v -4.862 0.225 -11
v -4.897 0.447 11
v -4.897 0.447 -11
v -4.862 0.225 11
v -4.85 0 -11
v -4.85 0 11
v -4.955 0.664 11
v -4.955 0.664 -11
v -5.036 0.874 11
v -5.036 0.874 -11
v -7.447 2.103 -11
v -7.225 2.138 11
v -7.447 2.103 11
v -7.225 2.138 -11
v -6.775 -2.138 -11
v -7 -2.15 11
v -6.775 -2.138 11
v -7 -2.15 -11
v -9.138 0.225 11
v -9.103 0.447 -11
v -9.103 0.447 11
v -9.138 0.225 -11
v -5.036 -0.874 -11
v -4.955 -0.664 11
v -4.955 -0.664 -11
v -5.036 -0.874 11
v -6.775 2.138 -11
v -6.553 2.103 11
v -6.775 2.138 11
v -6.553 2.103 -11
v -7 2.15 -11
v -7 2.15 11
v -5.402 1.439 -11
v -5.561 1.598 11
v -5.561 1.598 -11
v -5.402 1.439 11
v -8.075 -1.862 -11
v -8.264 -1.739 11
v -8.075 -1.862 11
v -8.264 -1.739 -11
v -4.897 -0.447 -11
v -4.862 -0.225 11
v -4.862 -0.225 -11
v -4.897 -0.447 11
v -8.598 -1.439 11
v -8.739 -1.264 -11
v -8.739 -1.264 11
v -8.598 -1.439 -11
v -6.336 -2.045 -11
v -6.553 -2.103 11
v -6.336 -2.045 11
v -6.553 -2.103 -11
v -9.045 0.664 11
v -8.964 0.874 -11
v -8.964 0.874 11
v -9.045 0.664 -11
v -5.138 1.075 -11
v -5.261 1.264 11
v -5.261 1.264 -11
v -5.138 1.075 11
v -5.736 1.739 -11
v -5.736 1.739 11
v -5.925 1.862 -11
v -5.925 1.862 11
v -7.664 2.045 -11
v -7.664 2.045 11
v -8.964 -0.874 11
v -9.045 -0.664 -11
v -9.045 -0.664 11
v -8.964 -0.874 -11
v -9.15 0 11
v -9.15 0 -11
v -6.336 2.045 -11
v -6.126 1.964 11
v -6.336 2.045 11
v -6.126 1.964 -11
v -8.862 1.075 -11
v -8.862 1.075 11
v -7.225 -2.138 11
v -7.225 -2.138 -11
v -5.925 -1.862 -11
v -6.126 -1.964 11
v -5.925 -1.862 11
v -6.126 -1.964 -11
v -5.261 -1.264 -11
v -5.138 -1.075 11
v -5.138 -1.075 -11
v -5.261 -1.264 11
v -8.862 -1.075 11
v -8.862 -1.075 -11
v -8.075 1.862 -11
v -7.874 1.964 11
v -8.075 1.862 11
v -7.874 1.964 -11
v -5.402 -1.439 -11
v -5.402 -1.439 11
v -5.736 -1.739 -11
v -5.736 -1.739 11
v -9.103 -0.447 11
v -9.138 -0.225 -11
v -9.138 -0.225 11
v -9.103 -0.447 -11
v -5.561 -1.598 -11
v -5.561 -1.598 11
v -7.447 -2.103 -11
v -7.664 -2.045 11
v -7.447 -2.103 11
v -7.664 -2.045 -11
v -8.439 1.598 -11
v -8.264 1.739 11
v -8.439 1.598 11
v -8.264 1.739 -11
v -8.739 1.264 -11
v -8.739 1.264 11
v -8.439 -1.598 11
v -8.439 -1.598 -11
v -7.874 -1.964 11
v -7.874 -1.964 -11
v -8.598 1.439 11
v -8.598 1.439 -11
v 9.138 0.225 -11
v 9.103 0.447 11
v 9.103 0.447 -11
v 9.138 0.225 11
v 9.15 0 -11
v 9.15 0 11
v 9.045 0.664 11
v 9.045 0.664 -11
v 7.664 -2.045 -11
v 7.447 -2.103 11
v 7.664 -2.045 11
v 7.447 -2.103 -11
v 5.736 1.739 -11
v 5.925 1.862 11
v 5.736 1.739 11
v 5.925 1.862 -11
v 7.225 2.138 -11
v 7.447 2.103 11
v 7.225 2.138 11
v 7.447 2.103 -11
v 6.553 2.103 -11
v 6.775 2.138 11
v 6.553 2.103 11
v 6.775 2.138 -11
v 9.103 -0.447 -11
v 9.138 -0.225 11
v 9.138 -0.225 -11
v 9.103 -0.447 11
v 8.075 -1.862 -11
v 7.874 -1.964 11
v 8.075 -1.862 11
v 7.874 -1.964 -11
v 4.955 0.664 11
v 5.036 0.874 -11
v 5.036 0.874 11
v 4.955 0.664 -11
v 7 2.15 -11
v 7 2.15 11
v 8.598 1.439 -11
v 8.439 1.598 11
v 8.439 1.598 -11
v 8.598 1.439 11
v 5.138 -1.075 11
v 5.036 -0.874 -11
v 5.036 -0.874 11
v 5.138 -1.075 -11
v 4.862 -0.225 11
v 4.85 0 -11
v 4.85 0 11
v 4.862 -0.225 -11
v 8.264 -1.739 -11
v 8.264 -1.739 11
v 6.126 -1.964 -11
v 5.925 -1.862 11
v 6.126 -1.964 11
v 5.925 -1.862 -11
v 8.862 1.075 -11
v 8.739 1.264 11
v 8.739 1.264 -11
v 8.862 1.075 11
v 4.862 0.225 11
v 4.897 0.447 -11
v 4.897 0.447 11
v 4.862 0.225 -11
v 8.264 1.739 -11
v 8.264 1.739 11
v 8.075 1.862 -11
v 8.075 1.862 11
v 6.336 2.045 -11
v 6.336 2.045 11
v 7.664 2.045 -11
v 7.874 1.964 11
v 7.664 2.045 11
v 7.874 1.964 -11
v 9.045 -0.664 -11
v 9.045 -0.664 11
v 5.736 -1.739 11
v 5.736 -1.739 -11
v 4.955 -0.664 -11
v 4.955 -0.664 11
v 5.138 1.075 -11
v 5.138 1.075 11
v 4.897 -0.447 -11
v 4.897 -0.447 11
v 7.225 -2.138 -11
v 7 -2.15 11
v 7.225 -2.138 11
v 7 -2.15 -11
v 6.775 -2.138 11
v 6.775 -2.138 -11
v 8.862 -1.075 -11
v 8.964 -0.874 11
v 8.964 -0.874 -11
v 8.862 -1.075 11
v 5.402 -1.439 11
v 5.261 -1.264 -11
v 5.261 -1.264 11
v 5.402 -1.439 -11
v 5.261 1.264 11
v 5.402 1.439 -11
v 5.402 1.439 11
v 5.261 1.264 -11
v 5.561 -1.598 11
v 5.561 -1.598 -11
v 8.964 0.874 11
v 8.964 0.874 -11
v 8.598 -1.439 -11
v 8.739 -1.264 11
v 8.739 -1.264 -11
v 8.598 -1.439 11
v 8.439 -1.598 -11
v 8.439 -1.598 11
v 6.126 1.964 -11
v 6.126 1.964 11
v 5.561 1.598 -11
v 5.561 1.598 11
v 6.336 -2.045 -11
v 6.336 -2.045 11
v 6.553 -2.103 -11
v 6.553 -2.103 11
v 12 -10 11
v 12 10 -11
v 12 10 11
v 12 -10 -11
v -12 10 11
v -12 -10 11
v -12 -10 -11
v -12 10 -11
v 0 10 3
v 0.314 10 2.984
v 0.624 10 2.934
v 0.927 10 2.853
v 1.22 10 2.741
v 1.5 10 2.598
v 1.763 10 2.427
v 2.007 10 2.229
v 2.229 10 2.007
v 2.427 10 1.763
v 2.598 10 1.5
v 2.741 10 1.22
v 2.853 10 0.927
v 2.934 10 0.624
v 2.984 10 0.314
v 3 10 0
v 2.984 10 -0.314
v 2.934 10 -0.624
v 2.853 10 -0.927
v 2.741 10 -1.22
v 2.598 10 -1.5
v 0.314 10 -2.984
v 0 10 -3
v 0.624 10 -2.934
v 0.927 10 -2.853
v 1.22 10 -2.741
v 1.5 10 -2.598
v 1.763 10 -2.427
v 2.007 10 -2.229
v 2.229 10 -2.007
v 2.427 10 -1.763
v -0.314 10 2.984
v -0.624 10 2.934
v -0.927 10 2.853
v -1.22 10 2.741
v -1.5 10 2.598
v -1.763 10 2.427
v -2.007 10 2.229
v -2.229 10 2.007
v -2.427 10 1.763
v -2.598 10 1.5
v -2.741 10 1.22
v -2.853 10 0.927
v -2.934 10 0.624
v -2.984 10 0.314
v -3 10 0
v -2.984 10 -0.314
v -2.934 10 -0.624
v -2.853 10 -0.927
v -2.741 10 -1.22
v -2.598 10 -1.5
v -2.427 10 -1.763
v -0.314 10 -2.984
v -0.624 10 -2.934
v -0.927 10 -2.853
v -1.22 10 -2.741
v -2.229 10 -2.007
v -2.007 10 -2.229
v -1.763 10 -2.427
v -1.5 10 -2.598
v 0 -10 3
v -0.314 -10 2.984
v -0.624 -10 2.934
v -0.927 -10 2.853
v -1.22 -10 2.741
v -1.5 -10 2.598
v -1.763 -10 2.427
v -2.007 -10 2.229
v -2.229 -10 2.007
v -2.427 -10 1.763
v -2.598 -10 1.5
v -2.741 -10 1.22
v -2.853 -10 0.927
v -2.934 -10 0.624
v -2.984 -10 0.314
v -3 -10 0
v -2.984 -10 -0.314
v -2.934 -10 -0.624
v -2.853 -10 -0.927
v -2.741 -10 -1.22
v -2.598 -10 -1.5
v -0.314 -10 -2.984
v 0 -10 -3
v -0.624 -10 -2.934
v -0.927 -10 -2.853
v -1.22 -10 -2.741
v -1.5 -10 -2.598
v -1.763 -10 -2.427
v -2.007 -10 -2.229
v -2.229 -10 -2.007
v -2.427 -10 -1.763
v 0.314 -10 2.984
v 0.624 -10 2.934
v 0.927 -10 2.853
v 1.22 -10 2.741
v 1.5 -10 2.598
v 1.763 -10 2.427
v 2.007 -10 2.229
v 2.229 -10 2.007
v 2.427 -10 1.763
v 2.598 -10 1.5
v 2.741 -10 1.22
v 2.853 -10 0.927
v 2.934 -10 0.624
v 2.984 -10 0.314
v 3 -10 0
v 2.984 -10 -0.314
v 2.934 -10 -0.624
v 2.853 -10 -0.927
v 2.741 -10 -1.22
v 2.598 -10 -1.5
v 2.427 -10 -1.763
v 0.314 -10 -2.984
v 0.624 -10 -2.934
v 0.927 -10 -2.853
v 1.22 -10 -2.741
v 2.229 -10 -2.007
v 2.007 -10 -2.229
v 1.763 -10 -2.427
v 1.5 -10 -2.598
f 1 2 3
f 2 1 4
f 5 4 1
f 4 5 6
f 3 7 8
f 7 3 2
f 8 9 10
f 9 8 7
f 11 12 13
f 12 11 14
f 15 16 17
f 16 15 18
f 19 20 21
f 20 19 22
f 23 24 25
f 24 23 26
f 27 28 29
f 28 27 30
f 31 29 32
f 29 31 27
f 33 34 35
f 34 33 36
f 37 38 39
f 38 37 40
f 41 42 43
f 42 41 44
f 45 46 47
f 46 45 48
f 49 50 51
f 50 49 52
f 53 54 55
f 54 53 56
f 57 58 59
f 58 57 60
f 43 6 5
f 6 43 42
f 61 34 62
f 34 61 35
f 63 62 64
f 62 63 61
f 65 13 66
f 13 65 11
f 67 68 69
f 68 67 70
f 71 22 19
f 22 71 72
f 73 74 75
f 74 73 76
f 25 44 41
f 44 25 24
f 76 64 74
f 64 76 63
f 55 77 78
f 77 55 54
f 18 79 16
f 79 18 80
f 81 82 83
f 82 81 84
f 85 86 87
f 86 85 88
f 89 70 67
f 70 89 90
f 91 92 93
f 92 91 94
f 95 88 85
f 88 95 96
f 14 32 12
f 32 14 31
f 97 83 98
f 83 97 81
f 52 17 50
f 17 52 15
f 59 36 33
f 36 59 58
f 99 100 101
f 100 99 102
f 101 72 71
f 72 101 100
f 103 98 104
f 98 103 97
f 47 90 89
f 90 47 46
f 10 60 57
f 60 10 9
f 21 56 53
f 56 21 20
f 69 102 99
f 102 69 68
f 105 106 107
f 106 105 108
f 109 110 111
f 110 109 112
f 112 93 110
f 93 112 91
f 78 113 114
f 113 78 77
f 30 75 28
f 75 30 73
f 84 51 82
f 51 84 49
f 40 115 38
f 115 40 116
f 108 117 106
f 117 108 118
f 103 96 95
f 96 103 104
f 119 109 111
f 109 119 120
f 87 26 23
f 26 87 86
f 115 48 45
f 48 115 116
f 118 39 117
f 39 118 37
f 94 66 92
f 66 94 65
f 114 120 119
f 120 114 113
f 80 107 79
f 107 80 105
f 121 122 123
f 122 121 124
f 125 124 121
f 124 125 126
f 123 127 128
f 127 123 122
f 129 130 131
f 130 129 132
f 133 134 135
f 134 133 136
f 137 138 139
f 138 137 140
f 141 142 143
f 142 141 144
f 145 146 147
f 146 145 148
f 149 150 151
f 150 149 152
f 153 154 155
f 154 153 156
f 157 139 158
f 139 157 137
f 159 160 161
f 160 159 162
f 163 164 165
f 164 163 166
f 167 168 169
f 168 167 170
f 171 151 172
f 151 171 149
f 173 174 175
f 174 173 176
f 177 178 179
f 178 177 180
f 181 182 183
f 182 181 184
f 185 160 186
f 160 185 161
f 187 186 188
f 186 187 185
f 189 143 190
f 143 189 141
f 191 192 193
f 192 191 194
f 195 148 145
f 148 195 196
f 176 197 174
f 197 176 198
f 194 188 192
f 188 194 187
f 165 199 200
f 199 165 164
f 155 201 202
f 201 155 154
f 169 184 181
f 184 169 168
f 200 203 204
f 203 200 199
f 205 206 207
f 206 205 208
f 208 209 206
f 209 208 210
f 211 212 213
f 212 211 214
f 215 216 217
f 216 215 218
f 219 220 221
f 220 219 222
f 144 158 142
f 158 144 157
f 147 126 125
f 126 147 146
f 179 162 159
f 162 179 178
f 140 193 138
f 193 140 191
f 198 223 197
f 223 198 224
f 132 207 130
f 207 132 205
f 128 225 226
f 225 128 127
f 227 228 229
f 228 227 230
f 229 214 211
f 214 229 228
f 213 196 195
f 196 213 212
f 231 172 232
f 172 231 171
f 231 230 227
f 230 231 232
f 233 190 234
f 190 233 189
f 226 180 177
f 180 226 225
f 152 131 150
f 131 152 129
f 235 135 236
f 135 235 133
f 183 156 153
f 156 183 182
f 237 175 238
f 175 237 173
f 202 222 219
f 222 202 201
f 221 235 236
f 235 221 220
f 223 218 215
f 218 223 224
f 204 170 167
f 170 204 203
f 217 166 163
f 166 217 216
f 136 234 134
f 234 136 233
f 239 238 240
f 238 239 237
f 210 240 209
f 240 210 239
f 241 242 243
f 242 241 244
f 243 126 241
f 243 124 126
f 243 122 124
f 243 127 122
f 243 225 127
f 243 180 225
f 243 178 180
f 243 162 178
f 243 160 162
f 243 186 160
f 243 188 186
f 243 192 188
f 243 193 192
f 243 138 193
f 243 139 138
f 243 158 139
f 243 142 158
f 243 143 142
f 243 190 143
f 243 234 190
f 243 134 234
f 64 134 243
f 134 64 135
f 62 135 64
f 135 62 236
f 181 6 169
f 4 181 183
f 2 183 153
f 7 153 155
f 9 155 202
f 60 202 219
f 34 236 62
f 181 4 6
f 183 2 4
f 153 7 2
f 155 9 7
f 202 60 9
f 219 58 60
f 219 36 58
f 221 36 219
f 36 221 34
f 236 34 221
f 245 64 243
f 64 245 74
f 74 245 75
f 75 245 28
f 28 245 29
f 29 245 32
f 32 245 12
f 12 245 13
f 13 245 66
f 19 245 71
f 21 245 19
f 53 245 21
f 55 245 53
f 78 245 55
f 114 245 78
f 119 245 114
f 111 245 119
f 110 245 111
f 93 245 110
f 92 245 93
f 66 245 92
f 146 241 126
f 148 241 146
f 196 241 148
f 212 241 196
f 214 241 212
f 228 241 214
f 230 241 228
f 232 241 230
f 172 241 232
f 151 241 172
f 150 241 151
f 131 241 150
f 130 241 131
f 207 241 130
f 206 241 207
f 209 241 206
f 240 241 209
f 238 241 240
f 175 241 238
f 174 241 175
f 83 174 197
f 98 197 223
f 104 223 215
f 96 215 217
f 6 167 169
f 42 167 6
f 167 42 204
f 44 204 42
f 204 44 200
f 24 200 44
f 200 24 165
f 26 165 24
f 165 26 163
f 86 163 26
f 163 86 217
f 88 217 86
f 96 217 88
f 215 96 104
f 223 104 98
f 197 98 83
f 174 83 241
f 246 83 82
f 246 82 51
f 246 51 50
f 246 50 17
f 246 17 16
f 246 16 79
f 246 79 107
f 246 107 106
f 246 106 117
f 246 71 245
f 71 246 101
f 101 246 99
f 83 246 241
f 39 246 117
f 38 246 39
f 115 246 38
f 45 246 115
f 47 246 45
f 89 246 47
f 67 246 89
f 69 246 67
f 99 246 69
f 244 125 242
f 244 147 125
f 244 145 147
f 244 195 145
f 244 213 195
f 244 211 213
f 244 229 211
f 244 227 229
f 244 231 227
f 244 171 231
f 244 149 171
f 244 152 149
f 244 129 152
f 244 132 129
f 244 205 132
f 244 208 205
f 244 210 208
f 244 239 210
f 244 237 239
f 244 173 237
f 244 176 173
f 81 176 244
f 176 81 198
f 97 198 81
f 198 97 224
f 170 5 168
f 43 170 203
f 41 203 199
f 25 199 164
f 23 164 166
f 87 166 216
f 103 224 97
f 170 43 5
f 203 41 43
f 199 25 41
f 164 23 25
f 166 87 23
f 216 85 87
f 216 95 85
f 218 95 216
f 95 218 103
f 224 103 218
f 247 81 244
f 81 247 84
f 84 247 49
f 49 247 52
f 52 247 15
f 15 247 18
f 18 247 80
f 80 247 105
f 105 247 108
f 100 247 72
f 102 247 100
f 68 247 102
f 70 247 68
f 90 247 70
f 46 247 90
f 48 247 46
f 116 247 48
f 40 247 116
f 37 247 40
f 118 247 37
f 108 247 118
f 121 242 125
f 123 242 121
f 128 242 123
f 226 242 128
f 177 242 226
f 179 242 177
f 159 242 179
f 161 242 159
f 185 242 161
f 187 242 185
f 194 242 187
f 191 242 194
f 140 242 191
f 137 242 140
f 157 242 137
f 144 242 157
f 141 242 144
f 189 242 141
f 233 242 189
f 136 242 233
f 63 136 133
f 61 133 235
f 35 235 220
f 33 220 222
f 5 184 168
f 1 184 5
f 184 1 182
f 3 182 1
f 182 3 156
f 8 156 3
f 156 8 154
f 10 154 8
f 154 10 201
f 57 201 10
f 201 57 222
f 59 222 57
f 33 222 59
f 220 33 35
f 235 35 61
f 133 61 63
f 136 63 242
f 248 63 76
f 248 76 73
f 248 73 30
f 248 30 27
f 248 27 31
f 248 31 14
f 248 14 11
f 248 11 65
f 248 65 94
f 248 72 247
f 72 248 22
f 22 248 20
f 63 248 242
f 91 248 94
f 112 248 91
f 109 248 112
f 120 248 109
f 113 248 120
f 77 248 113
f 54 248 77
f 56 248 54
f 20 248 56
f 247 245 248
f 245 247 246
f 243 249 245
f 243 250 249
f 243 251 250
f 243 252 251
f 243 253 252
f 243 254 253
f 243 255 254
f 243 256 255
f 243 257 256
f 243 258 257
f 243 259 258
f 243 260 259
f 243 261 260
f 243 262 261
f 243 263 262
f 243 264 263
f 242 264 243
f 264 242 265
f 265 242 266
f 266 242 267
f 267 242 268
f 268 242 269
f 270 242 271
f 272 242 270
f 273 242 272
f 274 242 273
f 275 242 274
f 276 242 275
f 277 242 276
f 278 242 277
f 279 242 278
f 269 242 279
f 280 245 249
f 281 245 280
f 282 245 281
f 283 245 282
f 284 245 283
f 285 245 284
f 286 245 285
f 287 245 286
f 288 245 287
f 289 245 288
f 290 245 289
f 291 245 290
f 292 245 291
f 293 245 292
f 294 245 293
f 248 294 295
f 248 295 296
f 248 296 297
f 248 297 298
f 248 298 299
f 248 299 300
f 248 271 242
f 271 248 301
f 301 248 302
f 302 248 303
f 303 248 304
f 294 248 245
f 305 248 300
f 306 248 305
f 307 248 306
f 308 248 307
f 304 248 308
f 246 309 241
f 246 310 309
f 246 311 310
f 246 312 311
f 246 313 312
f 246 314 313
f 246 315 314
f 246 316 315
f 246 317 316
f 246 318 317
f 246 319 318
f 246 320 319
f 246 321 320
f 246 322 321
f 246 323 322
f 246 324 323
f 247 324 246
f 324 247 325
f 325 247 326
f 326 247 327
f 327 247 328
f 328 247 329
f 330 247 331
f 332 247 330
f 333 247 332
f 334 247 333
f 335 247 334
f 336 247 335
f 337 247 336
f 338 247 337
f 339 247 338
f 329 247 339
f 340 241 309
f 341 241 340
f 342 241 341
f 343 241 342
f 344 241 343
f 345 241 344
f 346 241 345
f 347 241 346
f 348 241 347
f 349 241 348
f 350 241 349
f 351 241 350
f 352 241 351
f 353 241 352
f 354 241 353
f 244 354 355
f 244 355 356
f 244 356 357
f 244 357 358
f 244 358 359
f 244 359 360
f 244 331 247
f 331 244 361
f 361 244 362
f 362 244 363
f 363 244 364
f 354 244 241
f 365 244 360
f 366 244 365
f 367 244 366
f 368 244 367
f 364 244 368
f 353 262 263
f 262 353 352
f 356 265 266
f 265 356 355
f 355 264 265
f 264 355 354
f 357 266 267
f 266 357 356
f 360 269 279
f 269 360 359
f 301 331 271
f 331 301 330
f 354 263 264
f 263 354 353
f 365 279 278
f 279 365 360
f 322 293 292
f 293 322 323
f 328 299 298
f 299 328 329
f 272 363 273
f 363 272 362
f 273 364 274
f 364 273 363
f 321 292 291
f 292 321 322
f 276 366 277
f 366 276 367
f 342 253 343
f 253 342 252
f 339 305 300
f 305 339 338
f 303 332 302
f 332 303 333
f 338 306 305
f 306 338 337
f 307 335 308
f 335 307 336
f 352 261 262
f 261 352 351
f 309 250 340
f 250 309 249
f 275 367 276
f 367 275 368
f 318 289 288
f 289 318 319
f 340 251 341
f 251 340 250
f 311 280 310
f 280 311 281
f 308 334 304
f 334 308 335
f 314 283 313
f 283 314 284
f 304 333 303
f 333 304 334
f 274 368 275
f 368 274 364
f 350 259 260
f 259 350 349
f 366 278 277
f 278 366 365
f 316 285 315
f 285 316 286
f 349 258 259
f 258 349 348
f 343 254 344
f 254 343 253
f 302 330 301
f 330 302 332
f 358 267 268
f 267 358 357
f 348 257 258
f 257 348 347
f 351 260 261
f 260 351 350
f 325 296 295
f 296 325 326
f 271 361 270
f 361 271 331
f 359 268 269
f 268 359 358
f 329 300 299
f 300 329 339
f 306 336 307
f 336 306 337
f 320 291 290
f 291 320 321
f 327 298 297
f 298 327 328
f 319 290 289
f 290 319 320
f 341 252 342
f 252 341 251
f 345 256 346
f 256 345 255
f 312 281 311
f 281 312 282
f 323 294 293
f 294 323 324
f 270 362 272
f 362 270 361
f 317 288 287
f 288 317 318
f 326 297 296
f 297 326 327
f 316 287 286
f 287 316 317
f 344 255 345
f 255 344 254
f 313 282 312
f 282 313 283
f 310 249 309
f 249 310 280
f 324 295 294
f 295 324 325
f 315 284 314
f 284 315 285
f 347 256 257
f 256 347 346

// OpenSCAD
// Linear rail stop block.
$fn = 60;
eps = 0.02;
width = 20;
height = 22;
bore_d = 6;
length = 24;
difference() {
    cube([length,width,height],center=true);
    translate([0,-width/2-eps,0]) rotate([-90,0,0]) cylinder(d=bore_d,h=width+2*eps);
    for(x=[-7,7]) translate([x,0,-height/2-eps]) cylinder(d=4.3,h=height+2*eps);
}
